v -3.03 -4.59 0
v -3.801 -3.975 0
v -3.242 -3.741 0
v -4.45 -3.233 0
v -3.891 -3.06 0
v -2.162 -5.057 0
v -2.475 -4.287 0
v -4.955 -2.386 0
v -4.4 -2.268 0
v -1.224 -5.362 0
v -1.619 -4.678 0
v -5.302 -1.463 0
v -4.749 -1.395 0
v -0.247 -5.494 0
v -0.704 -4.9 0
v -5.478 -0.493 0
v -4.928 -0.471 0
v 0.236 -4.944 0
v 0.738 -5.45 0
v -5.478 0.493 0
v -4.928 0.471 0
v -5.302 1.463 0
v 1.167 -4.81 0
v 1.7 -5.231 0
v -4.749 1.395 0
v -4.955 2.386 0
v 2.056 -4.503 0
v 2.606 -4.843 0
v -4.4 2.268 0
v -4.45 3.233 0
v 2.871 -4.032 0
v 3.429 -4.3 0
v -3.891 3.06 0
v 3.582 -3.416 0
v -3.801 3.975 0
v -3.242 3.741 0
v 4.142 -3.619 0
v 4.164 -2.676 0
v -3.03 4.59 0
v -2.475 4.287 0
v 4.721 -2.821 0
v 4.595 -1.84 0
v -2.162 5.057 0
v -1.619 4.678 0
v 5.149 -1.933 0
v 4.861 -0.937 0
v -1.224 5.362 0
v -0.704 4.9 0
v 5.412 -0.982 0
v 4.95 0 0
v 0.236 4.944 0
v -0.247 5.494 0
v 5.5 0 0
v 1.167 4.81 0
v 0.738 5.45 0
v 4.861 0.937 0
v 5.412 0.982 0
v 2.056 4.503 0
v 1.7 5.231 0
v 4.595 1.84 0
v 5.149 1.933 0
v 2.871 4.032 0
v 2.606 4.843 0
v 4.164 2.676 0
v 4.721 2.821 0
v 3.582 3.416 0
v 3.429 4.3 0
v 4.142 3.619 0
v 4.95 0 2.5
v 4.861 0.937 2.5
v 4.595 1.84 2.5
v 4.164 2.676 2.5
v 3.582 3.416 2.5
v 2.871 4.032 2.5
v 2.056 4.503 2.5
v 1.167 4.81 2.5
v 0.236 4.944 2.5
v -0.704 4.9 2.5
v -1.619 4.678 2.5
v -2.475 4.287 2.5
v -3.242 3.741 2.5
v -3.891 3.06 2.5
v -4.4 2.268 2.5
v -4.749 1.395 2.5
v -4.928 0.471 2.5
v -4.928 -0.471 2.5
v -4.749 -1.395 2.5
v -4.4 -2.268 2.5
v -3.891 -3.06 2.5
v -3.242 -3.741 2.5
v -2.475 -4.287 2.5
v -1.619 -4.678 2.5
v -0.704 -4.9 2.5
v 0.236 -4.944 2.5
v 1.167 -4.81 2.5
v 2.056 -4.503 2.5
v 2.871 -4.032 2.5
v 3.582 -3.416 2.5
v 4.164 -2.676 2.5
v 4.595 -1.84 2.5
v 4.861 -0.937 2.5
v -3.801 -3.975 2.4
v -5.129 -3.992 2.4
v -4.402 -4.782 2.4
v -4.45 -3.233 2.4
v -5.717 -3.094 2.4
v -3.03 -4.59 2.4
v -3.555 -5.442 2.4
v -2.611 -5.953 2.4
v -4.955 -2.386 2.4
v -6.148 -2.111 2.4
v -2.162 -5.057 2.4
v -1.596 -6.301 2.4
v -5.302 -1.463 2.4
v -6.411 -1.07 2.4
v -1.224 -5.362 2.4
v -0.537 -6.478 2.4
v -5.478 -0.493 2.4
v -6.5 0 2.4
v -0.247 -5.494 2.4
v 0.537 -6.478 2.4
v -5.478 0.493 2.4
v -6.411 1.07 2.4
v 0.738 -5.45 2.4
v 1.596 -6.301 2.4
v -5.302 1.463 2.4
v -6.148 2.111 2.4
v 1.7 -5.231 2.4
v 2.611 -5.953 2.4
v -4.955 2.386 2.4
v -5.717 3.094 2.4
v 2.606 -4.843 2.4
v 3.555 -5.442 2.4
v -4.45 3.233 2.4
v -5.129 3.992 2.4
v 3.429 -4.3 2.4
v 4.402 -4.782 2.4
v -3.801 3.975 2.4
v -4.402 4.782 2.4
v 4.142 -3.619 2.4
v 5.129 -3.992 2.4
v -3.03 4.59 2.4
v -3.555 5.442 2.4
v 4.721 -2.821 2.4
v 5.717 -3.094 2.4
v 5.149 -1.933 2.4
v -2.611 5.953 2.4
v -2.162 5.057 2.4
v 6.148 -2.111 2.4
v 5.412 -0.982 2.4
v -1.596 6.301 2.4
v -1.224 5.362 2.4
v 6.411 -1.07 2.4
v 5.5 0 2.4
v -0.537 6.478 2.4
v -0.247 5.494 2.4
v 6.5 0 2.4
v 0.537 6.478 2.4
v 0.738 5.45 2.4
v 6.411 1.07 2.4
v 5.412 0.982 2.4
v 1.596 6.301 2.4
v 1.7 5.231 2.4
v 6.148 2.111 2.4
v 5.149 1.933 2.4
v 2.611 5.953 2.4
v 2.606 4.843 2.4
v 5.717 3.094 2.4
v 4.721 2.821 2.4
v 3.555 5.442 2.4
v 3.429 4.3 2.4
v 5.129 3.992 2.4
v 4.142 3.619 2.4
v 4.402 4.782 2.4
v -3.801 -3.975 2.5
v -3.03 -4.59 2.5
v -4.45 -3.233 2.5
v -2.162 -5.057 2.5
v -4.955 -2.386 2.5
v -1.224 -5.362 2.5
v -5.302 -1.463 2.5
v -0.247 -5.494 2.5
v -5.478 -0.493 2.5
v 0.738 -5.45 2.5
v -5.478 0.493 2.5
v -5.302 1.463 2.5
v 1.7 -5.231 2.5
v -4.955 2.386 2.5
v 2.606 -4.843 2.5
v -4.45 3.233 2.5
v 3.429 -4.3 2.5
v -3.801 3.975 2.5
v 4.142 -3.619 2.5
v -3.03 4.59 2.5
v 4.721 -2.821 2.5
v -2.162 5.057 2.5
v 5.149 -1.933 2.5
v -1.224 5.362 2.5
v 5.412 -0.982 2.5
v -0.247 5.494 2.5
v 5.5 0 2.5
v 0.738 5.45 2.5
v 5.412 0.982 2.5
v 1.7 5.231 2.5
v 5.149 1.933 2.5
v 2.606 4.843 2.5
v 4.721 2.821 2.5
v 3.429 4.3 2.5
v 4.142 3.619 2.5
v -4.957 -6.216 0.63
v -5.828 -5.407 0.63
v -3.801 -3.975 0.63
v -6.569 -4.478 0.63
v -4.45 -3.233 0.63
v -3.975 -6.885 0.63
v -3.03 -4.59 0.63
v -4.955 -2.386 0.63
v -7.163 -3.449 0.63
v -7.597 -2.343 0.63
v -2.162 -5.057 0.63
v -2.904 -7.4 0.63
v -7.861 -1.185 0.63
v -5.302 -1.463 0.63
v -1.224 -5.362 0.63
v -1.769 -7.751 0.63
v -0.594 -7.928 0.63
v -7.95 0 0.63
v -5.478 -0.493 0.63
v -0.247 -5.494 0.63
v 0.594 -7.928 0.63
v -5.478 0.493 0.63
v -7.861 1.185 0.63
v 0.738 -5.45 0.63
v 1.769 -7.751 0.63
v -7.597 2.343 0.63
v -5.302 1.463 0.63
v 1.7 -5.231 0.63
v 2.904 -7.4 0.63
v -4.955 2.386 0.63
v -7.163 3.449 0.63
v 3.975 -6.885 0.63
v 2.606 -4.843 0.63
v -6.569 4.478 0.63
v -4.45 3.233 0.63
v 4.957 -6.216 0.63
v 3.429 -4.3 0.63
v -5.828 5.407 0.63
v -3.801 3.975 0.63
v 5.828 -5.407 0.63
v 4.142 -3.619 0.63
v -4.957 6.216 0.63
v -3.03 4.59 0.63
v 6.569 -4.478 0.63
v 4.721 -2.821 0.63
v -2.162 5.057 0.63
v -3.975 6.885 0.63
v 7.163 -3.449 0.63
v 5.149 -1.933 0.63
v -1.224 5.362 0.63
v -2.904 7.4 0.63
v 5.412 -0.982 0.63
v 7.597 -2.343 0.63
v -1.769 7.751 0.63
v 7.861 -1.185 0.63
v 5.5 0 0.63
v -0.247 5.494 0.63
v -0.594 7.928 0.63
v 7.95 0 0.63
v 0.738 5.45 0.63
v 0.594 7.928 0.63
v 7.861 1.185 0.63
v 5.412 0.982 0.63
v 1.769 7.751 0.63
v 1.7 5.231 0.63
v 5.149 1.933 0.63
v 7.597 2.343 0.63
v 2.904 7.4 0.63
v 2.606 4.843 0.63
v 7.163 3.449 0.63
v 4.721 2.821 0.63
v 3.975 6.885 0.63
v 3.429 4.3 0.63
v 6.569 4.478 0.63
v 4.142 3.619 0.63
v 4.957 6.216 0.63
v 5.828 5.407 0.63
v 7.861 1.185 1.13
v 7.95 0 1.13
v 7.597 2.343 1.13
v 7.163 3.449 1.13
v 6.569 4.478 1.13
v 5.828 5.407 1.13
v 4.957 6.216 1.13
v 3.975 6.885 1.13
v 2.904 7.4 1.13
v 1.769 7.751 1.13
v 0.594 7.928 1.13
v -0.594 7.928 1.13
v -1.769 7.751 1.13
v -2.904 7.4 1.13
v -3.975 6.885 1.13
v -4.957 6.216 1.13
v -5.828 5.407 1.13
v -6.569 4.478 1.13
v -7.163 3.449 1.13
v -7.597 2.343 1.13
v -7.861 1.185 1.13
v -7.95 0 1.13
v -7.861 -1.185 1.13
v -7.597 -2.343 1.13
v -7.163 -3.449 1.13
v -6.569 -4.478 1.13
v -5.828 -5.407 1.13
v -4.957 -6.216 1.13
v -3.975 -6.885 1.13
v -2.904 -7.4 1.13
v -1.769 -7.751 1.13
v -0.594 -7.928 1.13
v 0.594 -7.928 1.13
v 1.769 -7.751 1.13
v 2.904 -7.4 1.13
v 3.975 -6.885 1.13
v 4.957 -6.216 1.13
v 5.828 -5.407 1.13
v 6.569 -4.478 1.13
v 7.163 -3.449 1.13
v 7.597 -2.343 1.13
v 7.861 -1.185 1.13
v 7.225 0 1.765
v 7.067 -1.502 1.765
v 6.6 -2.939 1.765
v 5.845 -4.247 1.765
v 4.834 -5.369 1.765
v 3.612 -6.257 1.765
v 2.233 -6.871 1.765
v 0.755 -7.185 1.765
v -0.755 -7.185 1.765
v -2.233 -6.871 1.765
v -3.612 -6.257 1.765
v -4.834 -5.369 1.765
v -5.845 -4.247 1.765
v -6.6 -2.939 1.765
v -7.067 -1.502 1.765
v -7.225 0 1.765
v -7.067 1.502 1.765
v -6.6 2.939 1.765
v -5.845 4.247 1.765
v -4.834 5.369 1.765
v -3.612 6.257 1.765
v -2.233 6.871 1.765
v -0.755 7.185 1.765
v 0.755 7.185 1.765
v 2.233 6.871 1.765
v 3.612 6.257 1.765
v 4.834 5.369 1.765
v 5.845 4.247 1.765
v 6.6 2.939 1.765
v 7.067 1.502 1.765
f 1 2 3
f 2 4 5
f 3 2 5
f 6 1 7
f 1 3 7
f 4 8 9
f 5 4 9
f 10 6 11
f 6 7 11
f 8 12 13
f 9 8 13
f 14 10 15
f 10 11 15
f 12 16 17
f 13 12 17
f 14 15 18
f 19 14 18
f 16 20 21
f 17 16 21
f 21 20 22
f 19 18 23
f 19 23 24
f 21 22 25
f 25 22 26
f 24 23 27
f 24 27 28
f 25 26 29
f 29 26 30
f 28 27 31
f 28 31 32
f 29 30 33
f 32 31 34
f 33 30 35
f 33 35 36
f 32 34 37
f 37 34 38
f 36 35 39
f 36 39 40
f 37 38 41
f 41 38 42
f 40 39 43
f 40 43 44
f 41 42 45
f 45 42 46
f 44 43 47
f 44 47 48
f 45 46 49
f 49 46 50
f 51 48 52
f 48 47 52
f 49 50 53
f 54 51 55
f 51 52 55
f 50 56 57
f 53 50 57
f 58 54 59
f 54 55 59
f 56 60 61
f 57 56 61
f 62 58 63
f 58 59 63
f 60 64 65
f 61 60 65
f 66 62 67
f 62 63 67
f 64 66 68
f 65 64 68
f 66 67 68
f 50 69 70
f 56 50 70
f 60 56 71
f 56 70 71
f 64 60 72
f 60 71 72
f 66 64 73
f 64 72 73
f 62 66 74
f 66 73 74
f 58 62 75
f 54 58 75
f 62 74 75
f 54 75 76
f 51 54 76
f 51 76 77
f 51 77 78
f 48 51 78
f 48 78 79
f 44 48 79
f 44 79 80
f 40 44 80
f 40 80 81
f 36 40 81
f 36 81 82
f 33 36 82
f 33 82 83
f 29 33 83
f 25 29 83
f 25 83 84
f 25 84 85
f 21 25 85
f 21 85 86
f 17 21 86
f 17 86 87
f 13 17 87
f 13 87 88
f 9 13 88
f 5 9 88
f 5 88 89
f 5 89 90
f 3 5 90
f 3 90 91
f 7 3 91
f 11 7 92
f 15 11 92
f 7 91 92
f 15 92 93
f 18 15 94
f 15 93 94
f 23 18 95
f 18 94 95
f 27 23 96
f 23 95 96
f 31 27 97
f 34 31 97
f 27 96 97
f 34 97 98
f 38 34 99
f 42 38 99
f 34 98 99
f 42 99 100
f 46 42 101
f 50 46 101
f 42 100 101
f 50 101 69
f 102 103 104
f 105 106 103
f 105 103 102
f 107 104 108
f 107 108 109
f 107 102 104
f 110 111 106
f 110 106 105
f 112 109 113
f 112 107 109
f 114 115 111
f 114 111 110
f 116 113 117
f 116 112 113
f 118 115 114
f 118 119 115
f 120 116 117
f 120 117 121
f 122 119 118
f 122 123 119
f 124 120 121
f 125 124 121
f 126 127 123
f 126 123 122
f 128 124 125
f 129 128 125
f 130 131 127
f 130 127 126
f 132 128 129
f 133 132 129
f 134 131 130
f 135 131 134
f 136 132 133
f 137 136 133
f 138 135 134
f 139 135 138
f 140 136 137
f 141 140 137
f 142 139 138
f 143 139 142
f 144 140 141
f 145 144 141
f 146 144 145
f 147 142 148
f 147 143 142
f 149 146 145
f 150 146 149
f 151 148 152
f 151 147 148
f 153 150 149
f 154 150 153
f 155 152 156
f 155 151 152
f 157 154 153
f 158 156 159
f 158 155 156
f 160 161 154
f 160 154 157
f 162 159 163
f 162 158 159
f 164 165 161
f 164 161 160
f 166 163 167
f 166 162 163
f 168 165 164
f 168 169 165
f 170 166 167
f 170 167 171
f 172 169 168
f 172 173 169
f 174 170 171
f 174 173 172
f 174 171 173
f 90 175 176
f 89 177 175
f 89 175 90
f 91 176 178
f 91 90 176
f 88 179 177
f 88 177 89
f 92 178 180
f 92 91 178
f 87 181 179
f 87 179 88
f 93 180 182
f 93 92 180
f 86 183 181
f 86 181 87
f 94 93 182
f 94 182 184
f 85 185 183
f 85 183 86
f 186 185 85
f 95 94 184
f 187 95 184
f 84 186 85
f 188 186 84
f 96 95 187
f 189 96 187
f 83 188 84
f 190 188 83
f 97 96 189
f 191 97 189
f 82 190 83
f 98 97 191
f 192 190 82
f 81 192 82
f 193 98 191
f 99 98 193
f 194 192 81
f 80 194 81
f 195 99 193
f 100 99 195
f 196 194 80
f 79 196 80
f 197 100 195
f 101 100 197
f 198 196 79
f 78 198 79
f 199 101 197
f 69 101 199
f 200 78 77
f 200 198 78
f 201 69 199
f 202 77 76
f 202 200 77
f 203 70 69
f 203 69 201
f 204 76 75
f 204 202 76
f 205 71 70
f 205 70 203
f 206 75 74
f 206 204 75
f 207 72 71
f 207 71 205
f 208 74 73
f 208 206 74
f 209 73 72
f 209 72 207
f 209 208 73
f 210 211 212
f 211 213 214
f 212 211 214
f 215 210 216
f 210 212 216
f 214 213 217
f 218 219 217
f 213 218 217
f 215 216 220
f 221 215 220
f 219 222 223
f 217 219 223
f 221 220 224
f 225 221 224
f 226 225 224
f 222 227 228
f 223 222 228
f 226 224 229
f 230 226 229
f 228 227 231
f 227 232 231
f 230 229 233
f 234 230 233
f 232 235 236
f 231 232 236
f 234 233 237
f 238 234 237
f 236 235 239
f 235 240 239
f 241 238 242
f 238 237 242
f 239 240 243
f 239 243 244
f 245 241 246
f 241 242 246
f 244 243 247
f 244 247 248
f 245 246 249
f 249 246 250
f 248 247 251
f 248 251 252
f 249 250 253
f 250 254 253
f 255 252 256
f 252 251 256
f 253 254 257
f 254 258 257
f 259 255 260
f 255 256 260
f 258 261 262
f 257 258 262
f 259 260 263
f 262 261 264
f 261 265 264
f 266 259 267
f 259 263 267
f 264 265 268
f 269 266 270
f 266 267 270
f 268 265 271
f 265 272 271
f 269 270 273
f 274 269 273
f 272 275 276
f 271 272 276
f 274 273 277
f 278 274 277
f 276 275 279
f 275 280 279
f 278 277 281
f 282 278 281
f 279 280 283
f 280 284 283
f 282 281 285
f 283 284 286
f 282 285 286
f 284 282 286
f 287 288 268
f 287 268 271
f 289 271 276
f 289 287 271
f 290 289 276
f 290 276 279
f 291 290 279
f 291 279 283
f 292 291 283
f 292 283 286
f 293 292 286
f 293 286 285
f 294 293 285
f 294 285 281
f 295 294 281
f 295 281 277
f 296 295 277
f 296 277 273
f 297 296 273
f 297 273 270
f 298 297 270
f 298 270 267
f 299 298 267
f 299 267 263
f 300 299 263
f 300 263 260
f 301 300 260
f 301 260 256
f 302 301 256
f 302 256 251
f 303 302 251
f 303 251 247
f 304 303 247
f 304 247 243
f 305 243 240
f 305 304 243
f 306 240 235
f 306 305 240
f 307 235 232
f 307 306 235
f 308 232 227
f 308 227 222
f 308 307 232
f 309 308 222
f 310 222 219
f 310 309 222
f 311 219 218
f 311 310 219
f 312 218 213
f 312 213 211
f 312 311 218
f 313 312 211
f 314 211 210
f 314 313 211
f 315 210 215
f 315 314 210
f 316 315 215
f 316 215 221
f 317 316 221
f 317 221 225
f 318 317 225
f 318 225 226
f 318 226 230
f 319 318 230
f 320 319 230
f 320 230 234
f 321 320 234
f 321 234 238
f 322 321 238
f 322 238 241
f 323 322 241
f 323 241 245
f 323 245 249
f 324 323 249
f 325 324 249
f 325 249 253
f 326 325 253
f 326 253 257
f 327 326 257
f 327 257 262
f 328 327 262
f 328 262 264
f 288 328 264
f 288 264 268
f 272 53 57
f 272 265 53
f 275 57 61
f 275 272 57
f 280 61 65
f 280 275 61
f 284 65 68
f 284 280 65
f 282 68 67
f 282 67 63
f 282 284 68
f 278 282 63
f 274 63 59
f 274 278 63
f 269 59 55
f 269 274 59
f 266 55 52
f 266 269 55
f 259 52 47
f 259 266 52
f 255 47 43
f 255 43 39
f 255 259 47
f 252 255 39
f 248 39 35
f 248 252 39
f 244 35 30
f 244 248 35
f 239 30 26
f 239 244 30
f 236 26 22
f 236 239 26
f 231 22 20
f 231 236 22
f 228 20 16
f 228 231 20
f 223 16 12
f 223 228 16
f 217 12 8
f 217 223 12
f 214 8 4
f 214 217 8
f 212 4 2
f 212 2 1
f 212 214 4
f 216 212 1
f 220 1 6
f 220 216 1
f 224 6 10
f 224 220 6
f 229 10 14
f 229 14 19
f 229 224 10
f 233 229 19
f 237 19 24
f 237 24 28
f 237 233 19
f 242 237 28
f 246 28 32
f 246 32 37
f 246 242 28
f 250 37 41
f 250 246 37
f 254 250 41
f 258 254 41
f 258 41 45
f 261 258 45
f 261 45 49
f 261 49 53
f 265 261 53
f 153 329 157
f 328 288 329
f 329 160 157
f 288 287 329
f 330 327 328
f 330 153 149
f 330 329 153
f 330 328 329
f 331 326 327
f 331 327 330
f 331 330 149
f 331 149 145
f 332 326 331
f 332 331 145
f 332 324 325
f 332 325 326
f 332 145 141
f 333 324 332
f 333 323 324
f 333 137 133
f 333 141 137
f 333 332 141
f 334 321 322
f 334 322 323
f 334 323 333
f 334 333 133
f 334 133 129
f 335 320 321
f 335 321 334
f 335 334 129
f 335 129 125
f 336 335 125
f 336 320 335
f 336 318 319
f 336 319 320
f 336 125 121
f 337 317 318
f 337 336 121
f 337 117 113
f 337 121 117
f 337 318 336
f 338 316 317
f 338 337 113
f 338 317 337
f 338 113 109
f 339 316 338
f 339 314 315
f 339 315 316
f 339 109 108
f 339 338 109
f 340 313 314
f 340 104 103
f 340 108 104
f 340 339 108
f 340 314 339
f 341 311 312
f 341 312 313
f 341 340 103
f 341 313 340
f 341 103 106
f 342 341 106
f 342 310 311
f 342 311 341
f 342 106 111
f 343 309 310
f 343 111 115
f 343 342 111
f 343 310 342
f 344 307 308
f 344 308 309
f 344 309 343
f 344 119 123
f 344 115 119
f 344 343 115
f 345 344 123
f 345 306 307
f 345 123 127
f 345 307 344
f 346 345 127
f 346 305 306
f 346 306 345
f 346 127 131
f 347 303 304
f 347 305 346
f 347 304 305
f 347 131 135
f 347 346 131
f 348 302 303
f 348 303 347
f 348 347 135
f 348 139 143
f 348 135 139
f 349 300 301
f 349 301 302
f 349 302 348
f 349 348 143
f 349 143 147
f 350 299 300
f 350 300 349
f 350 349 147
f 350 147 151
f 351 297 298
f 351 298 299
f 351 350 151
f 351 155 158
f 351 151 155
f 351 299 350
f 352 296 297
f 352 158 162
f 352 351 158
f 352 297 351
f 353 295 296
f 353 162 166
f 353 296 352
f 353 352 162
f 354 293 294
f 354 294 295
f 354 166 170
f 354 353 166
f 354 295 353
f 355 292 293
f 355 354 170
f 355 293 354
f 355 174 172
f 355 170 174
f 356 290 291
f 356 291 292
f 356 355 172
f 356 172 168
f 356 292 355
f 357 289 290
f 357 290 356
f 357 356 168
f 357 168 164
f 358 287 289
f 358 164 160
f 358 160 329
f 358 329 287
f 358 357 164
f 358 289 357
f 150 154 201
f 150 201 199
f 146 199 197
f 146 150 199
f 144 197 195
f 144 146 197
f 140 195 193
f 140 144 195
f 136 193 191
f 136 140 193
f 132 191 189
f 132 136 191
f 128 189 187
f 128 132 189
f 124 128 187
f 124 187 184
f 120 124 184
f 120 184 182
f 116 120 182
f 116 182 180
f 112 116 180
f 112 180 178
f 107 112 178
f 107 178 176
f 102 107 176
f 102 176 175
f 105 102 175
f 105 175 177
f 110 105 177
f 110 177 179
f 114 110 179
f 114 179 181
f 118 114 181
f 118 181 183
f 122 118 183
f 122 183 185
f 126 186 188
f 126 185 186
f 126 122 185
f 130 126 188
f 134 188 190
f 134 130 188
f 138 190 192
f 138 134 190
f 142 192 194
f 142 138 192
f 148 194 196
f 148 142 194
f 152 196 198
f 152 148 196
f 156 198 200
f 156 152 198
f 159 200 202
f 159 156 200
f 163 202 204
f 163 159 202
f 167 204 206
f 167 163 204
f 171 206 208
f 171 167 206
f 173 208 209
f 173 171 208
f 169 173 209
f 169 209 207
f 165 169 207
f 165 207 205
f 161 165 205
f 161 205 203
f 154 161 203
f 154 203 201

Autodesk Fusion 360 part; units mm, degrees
sketch "Sketch1" plane through (0, 0, 0) normal (0, 1, 0) x (1, 0, 0)
  line L0 (0, 0) -> (4.95, 0) construction
  line L1 (4.95, 0) -> (5.5, 0)
  line L2 (5.5, 0) -> (5.5, -0.63)
  line L3 (4.95, 0) -> (4.95, -2.5)
  line L4 (5.5, -0.63) -> (7.95, -0.63)
  line L5 (0, 0) -> (0, -2.6) construction
  line L6 (4.95, -2.5) -> (5.5, -2.5)
  line L7 (5.5, -2.5) -> (5.5, -2.4)
  line L8 (5.5, -2.4) -> (6.5, -2.4)
  line L9 (7.95, -0.63) -> (7.95, -1.13)
  line L10 (6.5, -2.4) -> (7.95, -1.13)
  dimension "d1" = 4.95
  dimension "d2" = 0.55
  dimension "d3" = 0.63
  dimension "d6" = 3
  dimension "d7" = 0.55
  dimension "d8" = 0.1
  dimension "d9" = 1.55
  dimension "d10" = 0.5
  dimension "d11" = 2.5
revolve "Revolve1" add sketch "Sketch1" angle 360 about axis through (0, 0, 0) along (0, 0, 1)
equation "d1 = ( 9.9 / 2 ) * 1 mm"
